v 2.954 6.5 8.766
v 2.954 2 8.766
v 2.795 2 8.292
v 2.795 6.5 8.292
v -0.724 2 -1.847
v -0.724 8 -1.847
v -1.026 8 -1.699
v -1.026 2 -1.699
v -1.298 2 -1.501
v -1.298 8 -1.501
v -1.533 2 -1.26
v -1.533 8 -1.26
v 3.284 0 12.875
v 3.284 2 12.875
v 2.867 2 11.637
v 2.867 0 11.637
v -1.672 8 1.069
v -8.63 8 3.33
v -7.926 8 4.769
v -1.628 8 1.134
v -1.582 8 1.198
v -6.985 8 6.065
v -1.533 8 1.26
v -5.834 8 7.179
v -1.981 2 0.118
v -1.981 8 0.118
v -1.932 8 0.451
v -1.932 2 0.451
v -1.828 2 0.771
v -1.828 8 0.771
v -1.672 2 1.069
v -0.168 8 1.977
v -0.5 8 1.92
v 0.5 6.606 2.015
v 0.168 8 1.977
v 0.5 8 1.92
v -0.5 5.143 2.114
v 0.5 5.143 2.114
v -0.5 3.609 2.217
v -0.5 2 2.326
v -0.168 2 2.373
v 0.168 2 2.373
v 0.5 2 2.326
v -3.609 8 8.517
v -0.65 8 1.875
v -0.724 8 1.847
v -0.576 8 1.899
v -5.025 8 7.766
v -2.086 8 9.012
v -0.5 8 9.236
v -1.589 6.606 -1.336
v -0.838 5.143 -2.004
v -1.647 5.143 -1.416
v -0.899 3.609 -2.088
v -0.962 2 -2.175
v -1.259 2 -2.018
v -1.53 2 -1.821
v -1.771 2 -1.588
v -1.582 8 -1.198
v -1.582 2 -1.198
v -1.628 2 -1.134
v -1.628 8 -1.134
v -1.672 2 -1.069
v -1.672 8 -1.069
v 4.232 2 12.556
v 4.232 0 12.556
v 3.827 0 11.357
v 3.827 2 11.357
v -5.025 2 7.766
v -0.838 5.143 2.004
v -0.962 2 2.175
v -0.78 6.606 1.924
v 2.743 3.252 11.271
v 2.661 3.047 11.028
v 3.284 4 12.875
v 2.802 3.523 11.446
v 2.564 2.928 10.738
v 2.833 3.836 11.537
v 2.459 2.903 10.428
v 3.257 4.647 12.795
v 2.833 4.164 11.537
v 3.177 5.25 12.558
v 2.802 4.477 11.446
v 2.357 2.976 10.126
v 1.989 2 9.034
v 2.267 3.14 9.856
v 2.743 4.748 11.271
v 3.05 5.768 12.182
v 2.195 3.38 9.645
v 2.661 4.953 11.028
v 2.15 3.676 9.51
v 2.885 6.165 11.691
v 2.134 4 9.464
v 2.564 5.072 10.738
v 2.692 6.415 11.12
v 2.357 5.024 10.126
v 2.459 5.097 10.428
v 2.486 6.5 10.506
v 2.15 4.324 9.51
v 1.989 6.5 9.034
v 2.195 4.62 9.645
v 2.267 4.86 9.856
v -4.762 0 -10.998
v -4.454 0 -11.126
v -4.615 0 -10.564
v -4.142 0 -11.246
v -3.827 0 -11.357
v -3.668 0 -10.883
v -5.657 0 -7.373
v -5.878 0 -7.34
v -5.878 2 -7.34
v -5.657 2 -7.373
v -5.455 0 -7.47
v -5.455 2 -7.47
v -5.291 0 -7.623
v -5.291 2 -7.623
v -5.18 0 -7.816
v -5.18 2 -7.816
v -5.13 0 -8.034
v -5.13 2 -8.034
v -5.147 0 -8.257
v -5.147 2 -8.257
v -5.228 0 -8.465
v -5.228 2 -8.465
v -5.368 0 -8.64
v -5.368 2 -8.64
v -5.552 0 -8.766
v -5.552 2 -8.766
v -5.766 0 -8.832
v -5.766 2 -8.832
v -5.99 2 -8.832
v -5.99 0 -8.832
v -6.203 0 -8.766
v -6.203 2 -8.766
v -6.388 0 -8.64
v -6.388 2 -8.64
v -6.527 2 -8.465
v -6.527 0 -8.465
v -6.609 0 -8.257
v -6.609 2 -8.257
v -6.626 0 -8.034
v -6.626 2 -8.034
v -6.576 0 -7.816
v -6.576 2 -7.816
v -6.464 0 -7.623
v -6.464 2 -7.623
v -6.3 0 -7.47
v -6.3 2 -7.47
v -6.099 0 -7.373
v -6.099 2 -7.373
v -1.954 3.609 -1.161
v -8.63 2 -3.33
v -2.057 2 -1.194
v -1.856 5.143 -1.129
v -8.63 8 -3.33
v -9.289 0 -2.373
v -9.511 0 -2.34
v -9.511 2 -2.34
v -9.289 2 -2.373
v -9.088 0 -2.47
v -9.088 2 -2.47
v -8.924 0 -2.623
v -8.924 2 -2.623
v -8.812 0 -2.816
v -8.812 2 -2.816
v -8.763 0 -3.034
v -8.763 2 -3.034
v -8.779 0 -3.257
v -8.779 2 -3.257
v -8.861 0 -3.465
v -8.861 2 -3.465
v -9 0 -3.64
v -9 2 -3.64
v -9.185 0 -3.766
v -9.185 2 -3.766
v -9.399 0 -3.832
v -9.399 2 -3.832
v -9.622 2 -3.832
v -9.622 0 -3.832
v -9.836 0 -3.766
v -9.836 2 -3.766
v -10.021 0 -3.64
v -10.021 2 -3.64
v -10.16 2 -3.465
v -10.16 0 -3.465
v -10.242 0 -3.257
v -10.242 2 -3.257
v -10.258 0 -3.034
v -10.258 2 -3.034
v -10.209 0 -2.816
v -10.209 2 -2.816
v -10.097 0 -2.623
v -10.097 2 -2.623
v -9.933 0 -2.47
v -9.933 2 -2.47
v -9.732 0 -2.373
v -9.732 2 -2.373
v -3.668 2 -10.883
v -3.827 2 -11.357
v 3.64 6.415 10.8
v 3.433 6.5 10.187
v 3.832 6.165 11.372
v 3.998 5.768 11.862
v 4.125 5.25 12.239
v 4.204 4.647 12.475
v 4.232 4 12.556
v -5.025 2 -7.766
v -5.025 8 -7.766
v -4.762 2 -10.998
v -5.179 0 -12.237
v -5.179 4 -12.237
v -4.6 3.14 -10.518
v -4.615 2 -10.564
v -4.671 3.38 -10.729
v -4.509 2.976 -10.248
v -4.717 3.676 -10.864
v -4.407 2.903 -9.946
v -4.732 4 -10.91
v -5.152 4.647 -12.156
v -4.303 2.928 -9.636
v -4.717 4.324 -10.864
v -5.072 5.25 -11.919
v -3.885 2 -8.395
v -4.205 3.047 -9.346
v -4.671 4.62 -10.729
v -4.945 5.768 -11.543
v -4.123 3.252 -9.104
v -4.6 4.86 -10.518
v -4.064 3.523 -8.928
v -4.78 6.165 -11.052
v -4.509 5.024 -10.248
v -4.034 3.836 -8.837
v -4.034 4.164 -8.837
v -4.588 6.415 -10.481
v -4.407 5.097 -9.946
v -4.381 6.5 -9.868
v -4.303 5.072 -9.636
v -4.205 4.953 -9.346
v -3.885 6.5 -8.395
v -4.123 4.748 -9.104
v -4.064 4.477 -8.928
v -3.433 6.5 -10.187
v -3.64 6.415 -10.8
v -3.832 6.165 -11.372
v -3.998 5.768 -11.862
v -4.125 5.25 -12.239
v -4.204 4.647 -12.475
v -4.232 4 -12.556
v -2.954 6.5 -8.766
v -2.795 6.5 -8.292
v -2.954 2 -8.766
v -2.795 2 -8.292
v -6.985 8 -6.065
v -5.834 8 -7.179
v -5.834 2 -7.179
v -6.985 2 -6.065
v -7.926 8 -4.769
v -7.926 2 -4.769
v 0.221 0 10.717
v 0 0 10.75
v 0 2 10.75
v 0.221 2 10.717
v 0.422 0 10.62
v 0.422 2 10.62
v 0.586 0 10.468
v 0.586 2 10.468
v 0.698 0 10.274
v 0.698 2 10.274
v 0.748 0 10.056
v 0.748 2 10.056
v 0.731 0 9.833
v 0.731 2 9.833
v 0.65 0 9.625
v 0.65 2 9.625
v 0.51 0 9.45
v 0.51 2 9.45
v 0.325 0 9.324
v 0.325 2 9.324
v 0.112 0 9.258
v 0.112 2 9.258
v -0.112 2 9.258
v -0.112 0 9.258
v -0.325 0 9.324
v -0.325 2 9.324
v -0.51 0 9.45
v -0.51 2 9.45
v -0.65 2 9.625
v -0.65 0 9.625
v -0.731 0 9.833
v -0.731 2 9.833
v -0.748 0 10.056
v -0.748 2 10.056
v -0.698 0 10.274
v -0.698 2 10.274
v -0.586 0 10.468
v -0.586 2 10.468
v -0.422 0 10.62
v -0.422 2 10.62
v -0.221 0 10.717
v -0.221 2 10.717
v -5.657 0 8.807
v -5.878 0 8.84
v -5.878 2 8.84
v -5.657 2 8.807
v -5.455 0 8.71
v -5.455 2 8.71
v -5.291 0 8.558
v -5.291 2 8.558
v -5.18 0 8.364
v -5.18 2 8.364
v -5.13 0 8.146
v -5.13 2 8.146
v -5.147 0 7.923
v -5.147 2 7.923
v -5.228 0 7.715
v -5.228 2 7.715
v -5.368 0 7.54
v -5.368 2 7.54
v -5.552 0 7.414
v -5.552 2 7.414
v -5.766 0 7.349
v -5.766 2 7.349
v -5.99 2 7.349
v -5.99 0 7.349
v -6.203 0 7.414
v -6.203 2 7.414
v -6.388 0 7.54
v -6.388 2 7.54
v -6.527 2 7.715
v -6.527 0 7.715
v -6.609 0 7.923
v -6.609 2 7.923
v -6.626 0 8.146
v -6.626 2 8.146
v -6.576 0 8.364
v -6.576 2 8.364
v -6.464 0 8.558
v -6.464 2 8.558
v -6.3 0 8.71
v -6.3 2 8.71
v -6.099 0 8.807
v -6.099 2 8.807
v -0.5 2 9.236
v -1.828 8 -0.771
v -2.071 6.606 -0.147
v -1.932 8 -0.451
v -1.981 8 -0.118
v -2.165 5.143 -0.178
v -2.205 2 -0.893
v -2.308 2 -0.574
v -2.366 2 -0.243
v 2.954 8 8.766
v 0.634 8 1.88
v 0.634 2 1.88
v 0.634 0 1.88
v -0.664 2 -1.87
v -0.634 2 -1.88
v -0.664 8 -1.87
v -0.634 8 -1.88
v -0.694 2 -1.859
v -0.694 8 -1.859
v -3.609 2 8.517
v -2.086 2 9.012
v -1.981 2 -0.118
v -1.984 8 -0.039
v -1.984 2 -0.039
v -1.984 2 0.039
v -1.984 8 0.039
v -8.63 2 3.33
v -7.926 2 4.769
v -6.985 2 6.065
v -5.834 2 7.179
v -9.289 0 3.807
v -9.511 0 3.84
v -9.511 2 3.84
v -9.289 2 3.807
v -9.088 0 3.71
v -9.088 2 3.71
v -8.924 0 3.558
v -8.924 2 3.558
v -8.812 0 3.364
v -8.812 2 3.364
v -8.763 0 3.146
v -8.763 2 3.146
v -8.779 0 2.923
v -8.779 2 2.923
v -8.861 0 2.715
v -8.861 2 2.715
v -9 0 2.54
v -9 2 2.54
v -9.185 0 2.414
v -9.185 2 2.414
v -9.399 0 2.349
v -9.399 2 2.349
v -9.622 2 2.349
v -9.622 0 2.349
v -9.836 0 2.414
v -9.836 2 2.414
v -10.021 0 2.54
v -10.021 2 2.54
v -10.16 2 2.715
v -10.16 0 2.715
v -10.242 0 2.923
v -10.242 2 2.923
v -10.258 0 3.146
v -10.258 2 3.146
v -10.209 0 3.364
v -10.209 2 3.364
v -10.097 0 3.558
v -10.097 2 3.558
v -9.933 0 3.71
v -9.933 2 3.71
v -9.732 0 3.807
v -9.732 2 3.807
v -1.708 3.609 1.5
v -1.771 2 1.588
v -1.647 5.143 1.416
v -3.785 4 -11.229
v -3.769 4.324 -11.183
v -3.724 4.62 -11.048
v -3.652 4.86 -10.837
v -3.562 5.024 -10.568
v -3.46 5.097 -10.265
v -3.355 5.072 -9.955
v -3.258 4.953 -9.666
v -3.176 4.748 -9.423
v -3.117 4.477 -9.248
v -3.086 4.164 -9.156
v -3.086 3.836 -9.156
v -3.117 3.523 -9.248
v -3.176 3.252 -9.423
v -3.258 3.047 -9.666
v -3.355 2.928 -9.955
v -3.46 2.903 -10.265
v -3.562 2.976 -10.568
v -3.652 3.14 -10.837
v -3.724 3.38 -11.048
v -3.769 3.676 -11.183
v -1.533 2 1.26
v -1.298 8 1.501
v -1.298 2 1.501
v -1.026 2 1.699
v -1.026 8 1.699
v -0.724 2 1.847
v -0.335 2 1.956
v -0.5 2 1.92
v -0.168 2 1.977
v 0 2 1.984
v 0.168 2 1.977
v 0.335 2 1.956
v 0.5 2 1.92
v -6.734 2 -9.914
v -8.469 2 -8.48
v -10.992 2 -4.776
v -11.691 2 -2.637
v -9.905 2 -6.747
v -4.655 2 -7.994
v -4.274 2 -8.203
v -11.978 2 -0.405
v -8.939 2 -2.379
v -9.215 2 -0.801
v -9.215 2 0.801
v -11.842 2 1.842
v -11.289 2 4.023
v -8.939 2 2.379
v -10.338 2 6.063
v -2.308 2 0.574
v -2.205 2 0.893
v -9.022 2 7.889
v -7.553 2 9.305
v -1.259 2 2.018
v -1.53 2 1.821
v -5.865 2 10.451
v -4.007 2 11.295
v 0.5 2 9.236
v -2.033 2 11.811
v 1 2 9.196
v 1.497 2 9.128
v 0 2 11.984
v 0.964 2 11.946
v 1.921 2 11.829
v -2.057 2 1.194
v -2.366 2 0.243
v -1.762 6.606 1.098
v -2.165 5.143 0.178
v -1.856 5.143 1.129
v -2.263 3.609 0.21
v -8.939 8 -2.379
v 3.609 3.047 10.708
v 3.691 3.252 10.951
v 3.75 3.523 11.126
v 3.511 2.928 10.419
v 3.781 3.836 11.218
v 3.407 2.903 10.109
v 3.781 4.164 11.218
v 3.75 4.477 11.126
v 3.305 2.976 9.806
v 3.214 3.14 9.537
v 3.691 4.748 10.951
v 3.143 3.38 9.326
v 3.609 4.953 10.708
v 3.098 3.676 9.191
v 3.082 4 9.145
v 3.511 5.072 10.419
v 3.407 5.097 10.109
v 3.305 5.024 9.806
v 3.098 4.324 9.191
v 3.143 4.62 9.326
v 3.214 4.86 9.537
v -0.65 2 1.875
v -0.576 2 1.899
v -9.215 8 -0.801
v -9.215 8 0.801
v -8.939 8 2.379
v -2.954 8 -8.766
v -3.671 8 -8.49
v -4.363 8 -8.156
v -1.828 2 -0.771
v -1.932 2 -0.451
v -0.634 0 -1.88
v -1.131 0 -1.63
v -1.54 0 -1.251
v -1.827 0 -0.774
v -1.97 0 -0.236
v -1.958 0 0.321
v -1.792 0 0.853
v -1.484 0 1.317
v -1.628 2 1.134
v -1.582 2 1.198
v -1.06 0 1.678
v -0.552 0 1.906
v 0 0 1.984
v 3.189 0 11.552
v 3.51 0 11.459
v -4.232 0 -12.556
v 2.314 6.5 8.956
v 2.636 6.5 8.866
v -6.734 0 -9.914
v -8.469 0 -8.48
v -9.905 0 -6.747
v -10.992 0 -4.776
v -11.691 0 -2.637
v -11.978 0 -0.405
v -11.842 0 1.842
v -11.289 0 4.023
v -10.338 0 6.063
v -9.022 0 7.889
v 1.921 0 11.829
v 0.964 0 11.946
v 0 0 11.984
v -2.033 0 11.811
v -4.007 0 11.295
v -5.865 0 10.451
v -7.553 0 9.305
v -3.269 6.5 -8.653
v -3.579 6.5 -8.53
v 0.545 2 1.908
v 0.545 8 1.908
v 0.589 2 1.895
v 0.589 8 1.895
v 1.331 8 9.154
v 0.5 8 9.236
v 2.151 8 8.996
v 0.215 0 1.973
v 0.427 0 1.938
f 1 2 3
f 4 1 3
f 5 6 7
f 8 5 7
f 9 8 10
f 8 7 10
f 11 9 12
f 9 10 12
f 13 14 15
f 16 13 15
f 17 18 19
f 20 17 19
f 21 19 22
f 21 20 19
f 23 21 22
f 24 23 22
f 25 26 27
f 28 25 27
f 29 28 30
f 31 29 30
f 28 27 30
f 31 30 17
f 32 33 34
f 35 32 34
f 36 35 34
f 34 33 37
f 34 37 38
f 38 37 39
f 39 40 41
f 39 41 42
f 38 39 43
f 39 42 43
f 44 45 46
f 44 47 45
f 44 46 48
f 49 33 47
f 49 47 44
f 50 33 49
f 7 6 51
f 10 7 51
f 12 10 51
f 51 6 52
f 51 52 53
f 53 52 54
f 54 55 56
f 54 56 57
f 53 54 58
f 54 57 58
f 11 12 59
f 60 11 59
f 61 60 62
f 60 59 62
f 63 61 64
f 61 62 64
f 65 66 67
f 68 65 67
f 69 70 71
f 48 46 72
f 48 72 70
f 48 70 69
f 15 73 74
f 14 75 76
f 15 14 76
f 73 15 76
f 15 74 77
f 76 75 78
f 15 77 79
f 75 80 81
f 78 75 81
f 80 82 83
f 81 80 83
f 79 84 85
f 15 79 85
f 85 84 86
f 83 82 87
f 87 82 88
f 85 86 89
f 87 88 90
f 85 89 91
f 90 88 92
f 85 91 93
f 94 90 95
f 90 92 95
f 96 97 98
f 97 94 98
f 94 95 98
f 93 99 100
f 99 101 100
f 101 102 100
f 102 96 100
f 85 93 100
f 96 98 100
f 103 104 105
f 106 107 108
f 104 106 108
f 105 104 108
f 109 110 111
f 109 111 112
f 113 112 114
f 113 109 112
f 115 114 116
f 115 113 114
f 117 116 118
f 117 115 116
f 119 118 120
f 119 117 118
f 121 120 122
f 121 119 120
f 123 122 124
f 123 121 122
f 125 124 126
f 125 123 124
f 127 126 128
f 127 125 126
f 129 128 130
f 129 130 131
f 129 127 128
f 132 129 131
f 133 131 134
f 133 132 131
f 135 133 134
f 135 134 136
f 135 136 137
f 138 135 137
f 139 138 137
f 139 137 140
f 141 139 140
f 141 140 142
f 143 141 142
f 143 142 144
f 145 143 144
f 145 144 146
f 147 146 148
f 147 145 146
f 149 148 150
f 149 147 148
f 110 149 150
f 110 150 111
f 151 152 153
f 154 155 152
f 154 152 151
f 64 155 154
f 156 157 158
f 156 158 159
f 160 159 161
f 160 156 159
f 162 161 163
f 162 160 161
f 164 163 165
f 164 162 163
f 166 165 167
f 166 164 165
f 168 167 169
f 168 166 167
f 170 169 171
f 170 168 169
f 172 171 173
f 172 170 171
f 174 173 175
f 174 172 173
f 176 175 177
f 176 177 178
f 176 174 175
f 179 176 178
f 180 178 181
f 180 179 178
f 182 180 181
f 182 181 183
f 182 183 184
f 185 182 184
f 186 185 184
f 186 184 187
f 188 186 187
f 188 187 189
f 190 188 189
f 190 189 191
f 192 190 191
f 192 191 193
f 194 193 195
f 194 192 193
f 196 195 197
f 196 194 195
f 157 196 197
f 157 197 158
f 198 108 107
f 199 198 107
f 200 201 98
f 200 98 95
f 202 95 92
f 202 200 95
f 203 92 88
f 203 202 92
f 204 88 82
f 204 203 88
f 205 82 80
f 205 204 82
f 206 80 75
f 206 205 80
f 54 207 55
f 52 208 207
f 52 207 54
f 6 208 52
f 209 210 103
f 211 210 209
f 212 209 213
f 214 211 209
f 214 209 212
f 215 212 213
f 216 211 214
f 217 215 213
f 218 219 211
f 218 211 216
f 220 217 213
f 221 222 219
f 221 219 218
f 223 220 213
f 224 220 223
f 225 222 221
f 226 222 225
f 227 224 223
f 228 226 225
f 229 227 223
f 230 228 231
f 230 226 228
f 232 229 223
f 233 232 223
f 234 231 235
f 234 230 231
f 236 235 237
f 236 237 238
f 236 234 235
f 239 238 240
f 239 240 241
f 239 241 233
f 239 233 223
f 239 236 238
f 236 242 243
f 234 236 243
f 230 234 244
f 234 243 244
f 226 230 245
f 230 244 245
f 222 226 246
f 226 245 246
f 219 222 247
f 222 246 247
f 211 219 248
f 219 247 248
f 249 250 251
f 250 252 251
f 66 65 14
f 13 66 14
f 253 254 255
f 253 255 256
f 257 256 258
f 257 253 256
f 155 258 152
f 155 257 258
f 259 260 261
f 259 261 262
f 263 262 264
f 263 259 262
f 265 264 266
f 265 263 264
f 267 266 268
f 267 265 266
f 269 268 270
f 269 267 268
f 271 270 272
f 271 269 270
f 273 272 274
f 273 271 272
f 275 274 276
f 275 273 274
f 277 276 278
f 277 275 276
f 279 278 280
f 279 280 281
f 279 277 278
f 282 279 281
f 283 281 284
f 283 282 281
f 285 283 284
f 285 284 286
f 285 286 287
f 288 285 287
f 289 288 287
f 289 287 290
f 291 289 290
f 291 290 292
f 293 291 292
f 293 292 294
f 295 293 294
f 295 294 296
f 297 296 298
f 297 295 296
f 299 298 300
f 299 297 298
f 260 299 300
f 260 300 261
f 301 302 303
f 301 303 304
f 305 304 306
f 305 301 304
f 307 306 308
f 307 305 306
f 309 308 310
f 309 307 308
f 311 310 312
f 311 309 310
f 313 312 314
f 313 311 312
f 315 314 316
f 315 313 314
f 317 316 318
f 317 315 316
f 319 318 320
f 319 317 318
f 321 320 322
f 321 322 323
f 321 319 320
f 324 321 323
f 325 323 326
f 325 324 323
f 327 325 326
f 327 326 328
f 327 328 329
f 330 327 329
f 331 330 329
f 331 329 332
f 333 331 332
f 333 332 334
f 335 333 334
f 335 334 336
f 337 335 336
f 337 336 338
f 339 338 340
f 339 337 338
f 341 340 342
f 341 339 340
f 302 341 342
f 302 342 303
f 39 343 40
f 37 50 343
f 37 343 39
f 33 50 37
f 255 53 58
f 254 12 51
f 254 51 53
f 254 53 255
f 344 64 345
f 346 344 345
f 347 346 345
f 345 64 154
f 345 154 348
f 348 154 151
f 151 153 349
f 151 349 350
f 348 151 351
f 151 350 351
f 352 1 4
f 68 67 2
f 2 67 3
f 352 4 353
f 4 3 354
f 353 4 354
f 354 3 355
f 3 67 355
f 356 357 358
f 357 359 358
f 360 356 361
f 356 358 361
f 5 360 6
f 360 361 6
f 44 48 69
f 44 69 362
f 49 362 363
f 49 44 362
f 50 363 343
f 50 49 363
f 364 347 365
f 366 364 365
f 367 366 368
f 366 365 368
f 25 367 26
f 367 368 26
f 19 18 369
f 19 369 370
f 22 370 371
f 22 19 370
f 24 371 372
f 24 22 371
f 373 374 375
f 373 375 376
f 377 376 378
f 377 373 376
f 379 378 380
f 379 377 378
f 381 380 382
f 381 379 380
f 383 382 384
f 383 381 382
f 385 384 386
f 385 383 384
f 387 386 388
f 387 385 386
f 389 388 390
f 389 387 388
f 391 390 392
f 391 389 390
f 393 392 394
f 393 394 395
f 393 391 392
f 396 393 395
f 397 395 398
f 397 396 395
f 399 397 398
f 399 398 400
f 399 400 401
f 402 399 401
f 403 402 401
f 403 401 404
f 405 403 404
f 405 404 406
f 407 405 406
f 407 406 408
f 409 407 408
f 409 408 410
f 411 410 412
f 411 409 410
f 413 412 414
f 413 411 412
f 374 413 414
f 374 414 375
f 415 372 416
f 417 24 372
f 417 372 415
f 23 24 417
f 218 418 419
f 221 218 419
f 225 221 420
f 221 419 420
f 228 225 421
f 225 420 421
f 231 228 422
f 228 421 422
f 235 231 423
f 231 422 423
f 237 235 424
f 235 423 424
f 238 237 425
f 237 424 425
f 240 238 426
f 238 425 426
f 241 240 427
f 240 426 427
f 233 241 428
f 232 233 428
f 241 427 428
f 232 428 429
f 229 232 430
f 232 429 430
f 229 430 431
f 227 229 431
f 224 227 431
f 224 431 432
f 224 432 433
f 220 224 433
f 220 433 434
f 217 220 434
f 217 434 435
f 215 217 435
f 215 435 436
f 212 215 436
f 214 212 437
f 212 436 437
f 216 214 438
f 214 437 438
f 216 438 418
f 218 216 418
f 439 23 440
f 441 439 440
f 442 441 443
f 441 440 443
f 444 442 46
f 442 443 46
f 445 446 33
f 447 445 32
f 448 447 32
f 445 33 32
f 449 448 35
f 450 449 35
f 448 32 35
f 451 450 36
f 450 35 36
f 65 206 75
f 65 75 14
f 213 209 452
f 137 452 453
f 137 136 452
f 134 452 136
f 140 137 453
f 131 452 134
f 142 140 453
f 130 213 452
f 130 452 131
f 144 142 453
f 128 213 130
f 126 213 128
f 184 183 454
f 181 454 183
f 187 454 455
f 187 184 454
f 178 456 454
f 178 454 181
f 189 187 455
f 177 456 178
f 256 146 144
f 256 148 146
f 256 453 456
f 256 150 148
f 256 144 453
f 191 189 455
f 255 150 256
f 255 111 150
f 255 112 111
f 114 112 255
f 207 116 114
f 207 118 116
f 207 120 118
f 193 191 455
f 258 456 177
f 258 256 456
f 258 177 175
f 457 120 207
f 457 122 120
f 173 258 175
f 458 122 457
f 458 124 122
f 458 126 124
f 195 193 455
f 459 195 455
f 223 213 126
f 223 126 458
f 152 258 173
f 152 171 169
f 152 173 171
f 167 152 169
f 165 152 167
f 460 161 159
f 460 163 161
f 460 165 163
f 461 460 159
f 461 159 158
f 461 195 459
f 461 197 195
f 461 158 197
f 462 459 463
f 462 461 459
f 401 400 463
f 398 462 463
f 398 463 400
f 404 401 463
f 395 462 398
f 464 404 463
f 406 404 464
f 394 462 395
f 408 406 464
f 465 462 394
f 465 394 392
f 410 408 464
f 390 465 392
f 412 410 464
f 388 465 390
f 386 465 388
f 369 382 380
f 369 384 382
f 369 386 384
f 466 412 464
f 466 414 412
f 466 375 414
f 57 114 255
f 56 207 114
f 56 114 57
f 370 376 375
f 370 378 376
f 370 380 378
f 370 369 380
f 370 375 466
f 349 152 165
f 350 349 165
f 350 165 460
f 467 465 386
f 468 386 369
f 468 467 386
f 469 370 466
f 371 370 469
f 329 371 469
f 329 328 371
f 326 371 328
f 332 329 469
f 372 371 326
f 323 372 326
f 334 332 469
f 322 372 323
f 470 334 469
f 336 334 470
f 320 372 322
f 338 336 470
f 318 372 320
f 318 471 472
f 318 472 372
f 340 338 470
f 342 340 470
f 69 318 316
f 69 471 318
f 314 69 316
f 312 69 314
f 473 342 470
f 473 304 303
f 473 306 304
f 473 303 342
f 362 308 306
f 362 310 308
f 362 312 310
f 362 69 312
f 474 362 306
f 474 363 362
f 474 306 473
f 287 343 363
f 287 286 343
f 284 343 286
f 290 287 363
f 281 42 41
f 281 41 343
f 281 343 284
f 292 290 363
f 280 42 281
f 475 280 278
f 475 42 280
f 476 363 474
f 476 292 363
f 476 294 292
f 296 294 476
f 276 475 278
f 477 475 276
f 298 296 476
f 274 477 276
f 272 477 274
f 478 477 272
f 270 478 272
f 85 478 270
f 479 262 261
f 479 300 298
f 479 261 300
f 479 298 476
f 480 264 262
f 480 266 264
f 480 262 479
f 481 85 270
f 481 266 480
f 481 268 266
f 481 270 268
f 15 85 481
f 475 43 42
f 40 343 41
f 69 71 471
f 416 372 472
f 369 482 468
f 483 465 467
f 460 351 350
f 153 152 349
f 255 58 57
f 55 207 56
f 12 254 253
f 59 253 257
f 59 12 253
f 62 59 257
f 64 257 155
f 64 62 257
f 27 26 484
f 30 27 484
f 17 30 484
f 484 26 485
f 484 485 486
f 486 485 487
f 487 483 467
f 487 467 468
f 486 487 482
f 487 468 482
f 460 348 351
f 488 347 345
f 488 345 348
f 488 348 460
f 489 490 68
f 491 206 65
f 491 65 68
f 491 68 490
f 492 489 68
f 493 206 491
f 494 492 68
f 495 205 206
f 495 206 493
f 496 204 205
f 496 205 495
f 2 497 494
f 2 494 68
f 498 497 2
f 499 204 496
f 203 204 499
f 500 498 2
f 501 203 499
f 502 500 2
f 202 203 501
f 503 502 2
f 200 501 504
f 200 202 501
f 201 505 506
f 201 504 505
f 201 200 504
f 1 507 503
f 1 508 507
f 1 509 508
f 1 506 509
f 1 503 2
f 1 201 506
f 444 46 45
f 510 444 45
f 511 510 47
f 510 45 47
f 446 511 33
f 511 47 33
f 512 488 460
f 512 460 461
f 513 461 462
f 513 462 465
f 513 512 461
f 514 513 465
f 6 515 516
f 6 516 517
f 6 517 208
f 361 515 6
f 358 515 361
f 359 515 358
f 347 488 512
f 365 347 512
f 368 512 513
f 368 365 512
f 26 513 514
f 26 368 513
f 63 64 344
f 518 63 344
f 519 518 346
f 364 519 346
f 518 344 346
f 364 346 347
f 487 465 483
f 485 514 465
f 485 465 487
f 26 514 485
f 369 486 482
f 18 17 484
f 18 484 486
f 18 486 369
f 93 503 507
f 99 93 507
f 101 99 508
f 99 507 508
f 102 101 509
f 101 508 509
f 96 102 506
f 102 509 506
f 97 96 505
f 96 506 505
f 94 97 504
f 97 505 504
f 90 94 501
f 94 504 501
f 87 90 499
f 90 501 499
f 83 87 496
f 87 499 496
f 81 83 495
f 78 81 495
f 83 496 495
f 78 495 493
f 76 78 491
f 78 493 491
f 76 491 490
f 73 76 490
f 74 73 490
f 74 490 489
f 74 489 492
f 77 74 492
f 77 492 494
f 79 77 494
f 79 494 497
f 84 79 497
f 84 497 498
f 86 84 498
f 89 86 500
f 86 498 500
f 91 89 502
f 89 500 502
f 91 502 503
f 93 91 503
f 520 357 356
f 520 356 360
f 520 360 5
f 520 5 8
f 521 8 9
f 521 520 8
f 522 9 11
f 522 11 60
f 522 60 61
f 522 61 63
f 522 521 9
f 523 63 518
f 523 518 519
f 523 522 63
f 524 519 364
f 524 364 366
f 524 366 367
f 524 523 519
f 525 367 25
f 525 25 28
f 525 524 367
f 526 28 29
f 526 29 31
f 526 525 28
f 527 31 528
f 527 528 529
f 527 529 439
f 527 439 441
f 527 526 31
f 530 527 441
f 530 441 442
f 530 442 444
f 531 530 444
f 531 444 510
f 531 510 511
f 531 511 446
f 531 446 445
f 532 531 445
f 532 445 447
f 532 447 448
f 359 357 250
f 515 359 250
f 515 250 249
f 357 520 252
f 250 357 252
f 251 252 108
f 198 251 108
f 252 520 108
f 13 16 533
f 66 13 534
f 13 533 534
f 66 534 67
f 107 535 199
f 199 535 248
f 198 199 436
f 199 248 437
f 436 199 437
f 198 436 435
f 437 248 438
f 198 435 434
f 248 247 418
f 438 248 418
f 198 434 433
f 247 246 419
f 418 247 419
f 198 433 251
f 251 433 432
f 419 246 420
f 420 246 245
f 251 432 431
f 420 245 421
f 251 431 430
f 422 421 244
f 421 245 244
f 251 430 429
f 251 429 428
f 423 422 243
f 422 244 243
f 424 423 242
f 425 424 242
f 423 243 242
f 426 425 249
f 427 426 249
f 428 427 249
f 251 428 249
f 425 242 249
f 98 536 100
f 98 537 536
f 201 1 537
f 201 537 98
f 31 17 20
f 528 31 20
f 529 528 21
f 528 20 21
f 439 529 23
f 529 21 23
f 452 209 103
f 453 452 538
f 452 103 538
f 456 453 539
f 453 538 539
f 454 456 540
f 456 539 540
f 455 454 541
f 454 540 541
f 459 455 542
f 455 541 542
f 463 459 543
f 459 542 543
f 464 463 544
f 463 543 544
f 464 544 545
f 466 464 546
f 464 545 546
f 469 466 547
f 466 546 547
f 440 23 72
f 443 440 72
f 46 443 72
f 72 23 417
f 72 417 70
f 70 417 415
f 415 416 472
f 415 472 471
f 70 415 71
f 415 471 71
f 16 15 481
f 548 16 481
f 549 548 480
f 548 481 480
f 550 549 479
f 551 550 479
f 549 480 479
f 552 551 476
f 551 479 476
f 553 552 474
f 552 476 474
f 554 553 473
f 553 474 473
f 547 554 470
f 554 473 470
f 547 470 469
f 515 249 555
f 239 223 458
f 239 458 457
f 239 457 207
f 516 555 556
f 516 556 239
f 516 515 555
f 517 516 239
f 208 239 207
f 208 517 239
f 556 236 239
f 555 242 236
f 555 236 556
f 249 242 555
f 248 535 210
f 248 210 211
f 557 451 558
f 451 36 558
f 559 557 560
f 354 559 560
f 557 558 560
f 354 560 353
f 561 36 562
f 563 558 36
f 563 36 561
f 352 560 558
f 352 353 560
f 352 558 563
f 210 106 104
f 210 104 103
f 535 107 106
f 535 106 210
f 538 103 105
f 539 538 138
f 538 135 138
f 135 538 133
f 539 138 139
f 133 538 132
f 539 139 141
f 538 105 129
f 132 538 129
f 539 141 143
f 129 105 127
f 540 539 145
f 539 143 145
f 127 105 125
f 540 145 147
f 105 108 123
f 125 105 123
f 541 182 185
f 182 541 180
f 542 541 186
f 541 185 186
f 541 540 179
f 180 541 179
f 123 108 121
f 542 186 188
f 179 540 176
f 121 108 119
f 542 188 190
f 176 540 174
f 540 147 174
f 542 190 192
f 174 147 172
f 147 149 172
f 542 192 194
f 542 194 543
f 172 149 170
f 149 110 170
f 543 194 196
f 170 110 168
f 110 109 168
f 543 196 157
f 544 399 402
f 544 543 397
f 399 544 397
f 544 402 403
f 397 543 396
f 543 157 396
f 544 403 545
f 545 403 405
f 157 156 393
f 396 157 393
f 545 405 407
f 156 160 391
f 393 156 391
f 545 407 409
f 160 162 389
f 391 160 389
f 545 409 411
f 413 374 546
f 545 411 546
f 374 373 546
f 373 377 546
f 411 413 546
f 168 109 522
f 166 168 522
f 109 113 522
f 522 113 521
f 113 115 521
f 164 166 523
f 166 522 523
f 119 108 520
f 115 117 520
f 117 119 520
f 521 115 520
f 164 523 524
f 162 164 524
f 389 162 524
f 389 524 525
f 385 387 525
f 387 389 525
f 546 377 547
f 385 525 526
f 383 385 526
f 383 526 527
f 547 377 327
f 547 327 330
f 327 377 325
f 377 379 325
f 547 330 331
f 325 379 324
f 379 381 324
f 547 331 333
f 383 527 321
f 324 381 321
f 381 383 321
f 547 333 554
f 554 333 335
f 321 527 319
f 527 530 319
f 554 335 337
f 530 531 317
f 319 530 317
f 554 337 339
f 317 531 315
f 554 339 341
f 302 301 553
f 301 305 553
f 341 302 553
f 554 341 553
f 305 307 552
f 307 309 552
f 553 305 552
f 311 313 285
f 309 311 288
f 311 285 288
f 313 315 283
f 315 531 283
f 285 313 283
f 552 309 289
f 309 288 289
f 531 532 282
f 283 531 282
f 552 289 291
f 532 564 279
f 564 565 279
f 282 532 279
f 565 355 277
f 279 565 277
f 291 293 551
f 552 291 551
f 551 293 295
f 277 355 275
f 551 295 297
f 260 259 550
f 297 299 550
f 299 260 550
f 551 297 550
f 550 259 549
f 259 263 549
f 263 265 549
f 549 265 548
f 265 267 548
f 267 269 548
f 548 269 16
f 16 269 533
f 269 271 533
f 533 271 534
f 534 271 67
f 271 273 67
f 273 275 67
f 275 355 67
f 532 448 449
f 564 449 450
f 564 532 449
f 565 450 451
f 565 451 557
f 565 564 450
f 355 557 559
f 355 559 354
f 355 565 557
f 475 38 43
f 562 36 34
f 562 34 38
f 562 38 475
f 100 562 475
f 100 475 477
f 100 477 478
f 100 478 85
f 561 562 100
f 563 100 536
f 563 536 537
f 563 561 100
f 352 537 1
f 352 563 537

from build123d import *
from build123d.topology import SkipClean

# Parameters (mm, degrees)
SKETCH1_R           = 11.984375
SKETCH1_R_2         = 1.984375
SKETCH1_R_3         = 0.75
BOSS_EXTRUDE1_DEPTH = 2
SKETCH6_W           = 23.96875
SKETCH6_H           = 8
CUT_EXTRUDE1_DEPTH  = 19.741677841
BOSS_EXTRUDE3_START = -2
SKETCH7_R           = 1.65
BOSS_EXTRUDE3_DEPTH = 2
SKETCH8_R           = 1.1
BOSS_EXTRUDE4_DEPTH = 1
CUT_EXTRUDE2_DEPTH  = 23.122053344


with BuildPart() as part:
    # Sketch1 → Boss-Extrude1 (new body)
    with BuildSketch(Plane(origin=(0, 0, 0), x_dir=(1, 0, 0), z_dir=(0, 1, 0))):
        with Locations(Location((0, 0, 0), (0, 0, 270))):
            Circle(SKETCH1_R)
        with Locations(Location((0, 0, 0), (0, 0, 270))):
            Circle(SKETCH1_R_2, mode=Mode.SUBTRACT)
        with Locations(Location((0, 10, 0), (0, 0, 270))):
            Circle(SKETCH1_R_3, mode=Mode.SUBTRACT)
        with Locations(Location((5.877852523, 8.090169944, 0), (0, 0, 270))):
            Circle(SKETCH1_R_3, mode=Mode.SUBTRACT)
        with Locations(Location((9.510565163, 3.090169944, 0), (0, 0, 270))):
            Circle(SKETCH1_R_3, mode=Mode.SUBTRACT)
        with Locations(Location((9.510565163, -3.090169944, 0), (0, 0, 270))):
            Circle(SKETCH1_R_3, mode=Mode.SUBTRACT)
        with Locations(Location((5.877852523, -8.090169944, 0), (0, 0, 270))):
            Circle(SKETCH1_R_3, mode=Mode.SUBTRACT)
        with Locations(Location((0, -10, 0), (0, 0, 270))):
            Circle(SKETCH1_R_3, mode=Mode.SUBTRACT)
        with Locations(Location((-5.877852523, -8.090169944, 0), (0, 0, 270))):
            Circle(SKETCH1_R_3, mode=Mode.SUBTRACT)
        with Locations(Location((-9.510565163, -3.090169944, 0), (0, 0, 270))):
            Circle(SKETCH1_R_3, mode=Mode.SUBTRACT)
        with Locations(Location((-9.510565163, 3.090169944, 0), (0, 0, 270))):
            Circle(SKETCH1_R_3, mode=Mode.SUBTRACT)
        with Locations(Location((-5.877852523, 8.090169944, 0), (0, 0, 270))):
            Circle(SKETCH1_R_3, mode=Mode.SUBTRACT)
    extrude(amount=BOSS_EXTRUDE1_DEPTH)

    # Sweep1: sweep along a path in Sketch3
    with SkipClean():  # the faces are left unmerged after this step: merging them gives an invalid solid
        with BuildLine(Plane(origin=(0, 0, 0), x_dir=(0, 0, -1), z_dir=(1, 0, 0))) as sweep1_path:
            Line((0, 2), (0, 8))
        # Sketch2 → Sweep1 (sweep)
        with BuildSketch(Plane(origin=(0, 2, 0), x_dir=(1, 0, 0), z_dir=(0, 1, 0))):
            with BuildLine():
                Line((-0.5, 9.236476601), (-0.5, 1.920350005))
                ThreePointArc((-0.5, 1.920350005), (-0.613205598, 1.887252775), (-0.724244915, 1.847488415))
                Line((-0.724244915, 1.847488415), (-5.024556232, 7.766359164))
                ThreePointArc((-5.024556232, 7.766359164), (-2.858407198, 8.797272776), (-0.5, 9.236476601))
            make_face()
            with BuildLine():
                Line((0.5, 9.236476601), (0.5, 1.920350005))
                ThreePointArc((0.5, 1.920350005), (0.613205598, 1.887252775), (0.724244915, 1.847488415))
                Line((0.724244915, 1.847488415), (5.024556232, 7.766359164))
                ThreePointArc((5.024556232, 7.766359164), (2.858407198, 8.797272776), (0.5, 9.236476601))
            make_face()
            with BuildLine():
                Line((5.833573226, 7.178573912), (1.533261909, 1.259703163))
                ThreePointArc((1.533261909, 1.259703163), (1.605393098, 1.16638636), (1.671852888, 1.068949045))
                Line((1.671852888, 1.068949045), (8.629902762, 3.329756496))
                ThreePointArc((8.629902762, 3.329756496), (7.483407198, 5.437013584), (5.833573226, 7.178573912))
            make_face()
            with BuildLine():
                Line((8.938919756, 2.37869998), (1.980869883, 0.117892528))
                ThreePointArc((1.980869883, 0.117892528), (1.984375, 0), (1.980869883, -0.117892528))
                Line((1.980869883, -0.117892528), (8.938919756, -2.37869998))
                ThreePointArc((8.938919756, -2.37869998), (9.25, 0), (8.938919756, 2.37869998))
            make_face()
            with BuildLine():
                Line((8.629902762, -3.329756496), (1.671852888, -1.068949045))
                ThreePointArc((1.671852888, -1.068949045), (1.605393098, -1.16638636), (1.533261909, -1.259703163))
                Line((1.533261909, -1.259703163), (5.833573226, -7.178573912))
                ThreePointArc((5.833573226, -7.178573912), (7.483407198, -5.437013584), (8.629902762, -3.329756496))
            make_face()
            with BuildLine():
                Line((5.024556232, -7.766359164), (0.724244915, -1.847488415))
                ThreePointArc((0.724244915, -1.847488415), (0.613205598, -1.887252775), (0.5, -1.920350005))
                Line((0.5, -1.920350005), (0.5, -9.236476601))
                ThreePointArc((0.5, -9.236476601), (2.858407198, -8.797272776), (5.024556232, -7.766359164))
            make_face()
            with BuildLine():
                Line((-0.5, -9.236476601), (-0.5, -1.920350005))
                ThreePointArc((-0.5, -1.920350005), (-0.613205598, -1.887252775), (-0.724244915, -1.847488415))
                Line((-0.724244915, -1.847488415), (-5.024556232, -7.766359164))
                ThreePointArc((-5.024556232, -7.766359164), (-2.858407198, -8.797272776), (-0.5, -9.236476601))
            make_face()
            with BuildLine():
                Line((-5.833573226, -7.178573912), (-1.533261909, -1.259703163))
                ThreePointArc((-1.533261909, -1.259703163), (-1.605393098, -1.16638636), (-1.671852888, -1.068949045))
                Line((-1.671852888, -1.068949045), (-8.629902762, -3.329756496))
                ThreePointArc((-8.629902762, -3.329756496), (-7.483407198, -5.437013584), (-5.833573226, -7.178573912))
            make_face()
            with BuildLine():
                Line((-8.938919756, -2.37869998), (-1.980869883, -0.117892528))
                ThreePointArc((-1.980869883, -0.117892528), (-1.984375, 0), (-1.980869883, 0.117892528))
                Line((-1.980869883, 0.117892528), (-8.938919756, 2.37869998))
                ThreePointArc((-8.938919756, 2.37869998), (-9.25, 0), (-8.938919756, -2.37869998))
            make_face()
            with BuildLine():
                Line((-8.629902762, 3.329756496), (-1.671852888, 1.068949045))
                ThreePointArc((-1.671852888, 1.068949045), (-1.605393098, 1.16638636), (-1.533261909, 1.259703163))
                Line((-1.533261909, 1.259703163), (-5.833573226, 7.178573912))
                ThreePointArc((-5.833573226, 7.178573912), (-7.483407198, 5.437013584), (-8.629902762, 3.329756496))
            make_face()
        sweep(path=sweep1_path.line)

    # Sketch4 → Revolve1 (revolve)
    with SkipClean():  # the faces are left unmerged after this step: merging them gives an invalid solid
        with BuildSketch(Plane(origin=(0, 0, 0), x_dir=(0, 0, -1), z_dir=(1, 0, 0)), mode=Mode.PRIVATE) as revolve1_sk:
            Polygon((-2.37869998, 2), (-1.984375, 2), (-1.984375, 8), align=None)
        revolve(revolve1_sk.sketch.rotate(Axis((0, 0, 0), (0, 1, 0)), 165.405971265), axis=Axis((0, 0, 0), (0, 1, 0)))

    # Sketch6 → Cut-Extrude1 (cut, through all)
    with SkipClean():  # the faces are left unmerged after this step: merging them gives an invalid solid
        with BuildSketch(Plane(origin=(0, 0, 0), x_dir=(-0.3193728209047868, 0, -0.9476291475399641), z_dir=(-0.9476291475399641, 0, 0.3193728209047868))):
            with Locations((0, -4)):
                Rectangle(SKETCH6_W, SKETCH6_H)
        extrude(amount=-CUT_EXTRUDE1_DEPTH, mode=Mode.SUBTRACT)

    # Sketch7 → Boss-Extrude3 (add)
    with SkipClean():  # the faces are left unmerged after this step: merging them gives an invalid solid
        with BuildSketch(Plane(origin=(0, 2, 0), x_dir=(1, 0, 0), z_dir=(0, 1, 0)).offset(BOSS_EXTRUDE3_START)):
            with BuildLine():
                Line((-9.021857716, -7.888683508), (-1.576209535, -16.403865848))
                ThreePointArc((-1.576209535, -16.403865848), (2.803074288, -17.134270389), (4.375298385, -12.982195127))
                Line((4.375298385, -12.982195127), (3.827483651, -11.356743065))
                ThreePointArc((3.827483651, -11.356743065), (-3.122857627, -11.570350227), (-9.021857716, -7.888683508))
            make_face()
            with Locations(Location((1.058596369, -14.1, 0), (0, 0, 270))):
                Circle(SKETCH7_R, mode=Mode.SUBTRACT)
        extrude(amount=BOSS_EXTRUDE3_DEPTH)

    # Sketch8 → Boss-Extrude4 (add)
    # profile 1 of 2: a face of its own
    with SkipClean():  # the faces are left unmerged after this step: merging them gives an invalid solid
        with BuildSketch(Plane(origin=(0, 0, 0), x_dir=(-0.31937282090478675, 0, -0.9476291475399641), z_dir=(0.9476291475399641, 0, -0.31937282090478675))):
            with BuildLine():
                Line((-13.25, 4), (-13.25, 2))
                Line((-13.25, 2), (-8.75, 2))
                Line((-8.75, 2), (-8.75, 6.5))
                Line((-8.75, 6.5), (-9.25, 6.5))
                Line((-9.25, 6.5), (-10.75, 6.5))
                ThreePointArc((-10.75, 6.5), (-12.517766953, 5.767766953), (-13.25, 4))
            make_face()
            with Locations((-10.75, 4)):
                Circle(SKETCH8_R, mode=Mode.SUBTRACT)
        # profile 2 of 2: a face of its own
        with BuildSketch(Plane(origin=(0, 0, 0), x_dir=(-0.31937282090478675, 0, -0.9476291475399641), z_dir=(0.9476291475399641, 0, -0.31937282090478675))):
            with BuildLine():
                Line((11.484375, 2), (8.75, 2))
                Line((8.75, 2), (8.75, 6.5))
                Line((8.75, 6.5), (9.25, 6.5))
                Line((9.25, 6.5), (10.75, 6.5))
                ThreePointArc((10.75, 6.5), (12.517766953, 5.767766953), (13.25, 4))
                Line((13.25, 4), (13.25, 2))
                Line((13.25, 2), (13.25, 0))
                Line((13.25, 0), (11.984375, 0))
                Line((11.984375, 0), (11.484375, 0))
                Line((11.484375, 0), (11.484375, 2))
            make_face()
            with Locations((10.75, 4)):
                Circle(SKETCH8_R, mode=Mode.SUBTRACT)
        extrude(amount=-BOSS_EXTRUDE4_DEPTH)

    # Sketch9 → Cut-Extrude2 (cut, through all)
    with SkipClean():  # the faces are left unmerged after this step: merging them gives an invalid solid
        with BuildSketch(Plane(origin=(0, 2, 0), x_dir=(1, 0, 0), z_dir=(0, 1, 0))):
            with BuildLine():
                Line((-9.021857716, -7.888683508), (-1.576209535, -16.403865848))
                ThreePointArc((-1.576209535, -16.403865848), (2.803074288, -17.134270389), (4.375298385, -12.982195127))
                Line((4.375298385, -12.982195127), (4.231689877, -12.556086205))
                Line((4.231689877, -12.556086205), (3.284060729, -12.875459026))
                Line((3.284060729, -12.875459026), (2.866506678, -11.6365108))
                ThreePointArc((2.866506678, -11.6365108), (-3.603281692, -11.429855869), (-9.021857716, -7.888683508))
            make_face()
        extrude(amount=-CUT_EXTRUDE2_DEPTH, mode=Mode.SUBTRACT)


solid = part.part
